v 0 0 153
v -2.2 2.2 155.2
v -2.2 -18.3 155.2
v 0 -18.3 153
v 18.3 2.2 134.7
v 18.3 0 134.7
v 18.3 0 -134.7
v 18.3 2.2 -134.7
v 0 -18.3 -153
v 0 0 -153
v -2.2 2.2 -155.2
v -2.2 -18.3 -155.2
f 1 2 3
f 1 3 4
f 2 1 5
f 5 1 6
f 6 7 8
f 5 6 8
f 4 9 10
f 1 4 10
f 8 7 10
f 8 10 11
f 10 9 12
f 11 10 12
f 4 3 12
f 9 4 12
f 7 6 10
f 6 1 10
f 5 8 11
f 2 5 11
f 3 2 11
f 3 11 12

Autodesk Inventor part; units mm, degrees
ref_plane "YZ Plane" through (0, 0, 0) normal (1, 0, 0) x (0, 1, 0)
ref_plane "XZ Plane" through (0, 0, 0) normal (0, 1, 0) x (-1, 0, 0)
ref_plane "XY Plane" through (0, 0, 0) normal (0, 0, 1) x (1, 0, 0)
sketch "Esquisse1" plane through (0, 0, 0) normal (0, 0, 1) x (1, 0, 0)
  line L0 (0, 0) -> (18.3, 0)
  line L1 (18.3, 0) -> (18.3, 2.2)
  line L2 (18.3, 2.2) -> (-2.2, 2.2)
  line L3 (-2.2, 2.2) -> (-2.2, -18.3)
  line L4 (-2.2, -18.3) -> (0, -18.3)
  line L5 (0, -18.3) -> (0, 0)
  dimension "Epaisseur_cornière" = 2.2
  dimension "Largueur" = 20.5
extrude "Embase" add sketch "Esquisse1" along normal mid plane 310.4
sketch "Esquisse2" plane through (0, 0, 0) normal (0, 1, 0) x (-1, 0, 0)
  line L0 (2.2, 155.2) -> (-18.3, 134.7)
  line L1 (-18.3, 134.7) -> (-18.3, 155.2)
  line L2 (-18.3, 155.2) -> (2.2, 155.2)
  line L3 (-18.3, 155.2) -> (2.2, 155.2) construction
  line L4 (2.2, -155.2) -> (2.2, 155.2) construction
  line L5 (-18.3, -155.2) -> (-18.3, 155.2) construction
  point P0 (0, 0)
  dimension "d4" = 45
extrude "Découpe à 45" cut sketch "Esquisse2" along normal through all both and the other way through all
mirror "Symétrie découpe" about plane through (0, 0, 0) normal (0, 0, 1) of "Découpe à 45"
properties part number "Profilé superieur cote" material "Aluminium 6061"
